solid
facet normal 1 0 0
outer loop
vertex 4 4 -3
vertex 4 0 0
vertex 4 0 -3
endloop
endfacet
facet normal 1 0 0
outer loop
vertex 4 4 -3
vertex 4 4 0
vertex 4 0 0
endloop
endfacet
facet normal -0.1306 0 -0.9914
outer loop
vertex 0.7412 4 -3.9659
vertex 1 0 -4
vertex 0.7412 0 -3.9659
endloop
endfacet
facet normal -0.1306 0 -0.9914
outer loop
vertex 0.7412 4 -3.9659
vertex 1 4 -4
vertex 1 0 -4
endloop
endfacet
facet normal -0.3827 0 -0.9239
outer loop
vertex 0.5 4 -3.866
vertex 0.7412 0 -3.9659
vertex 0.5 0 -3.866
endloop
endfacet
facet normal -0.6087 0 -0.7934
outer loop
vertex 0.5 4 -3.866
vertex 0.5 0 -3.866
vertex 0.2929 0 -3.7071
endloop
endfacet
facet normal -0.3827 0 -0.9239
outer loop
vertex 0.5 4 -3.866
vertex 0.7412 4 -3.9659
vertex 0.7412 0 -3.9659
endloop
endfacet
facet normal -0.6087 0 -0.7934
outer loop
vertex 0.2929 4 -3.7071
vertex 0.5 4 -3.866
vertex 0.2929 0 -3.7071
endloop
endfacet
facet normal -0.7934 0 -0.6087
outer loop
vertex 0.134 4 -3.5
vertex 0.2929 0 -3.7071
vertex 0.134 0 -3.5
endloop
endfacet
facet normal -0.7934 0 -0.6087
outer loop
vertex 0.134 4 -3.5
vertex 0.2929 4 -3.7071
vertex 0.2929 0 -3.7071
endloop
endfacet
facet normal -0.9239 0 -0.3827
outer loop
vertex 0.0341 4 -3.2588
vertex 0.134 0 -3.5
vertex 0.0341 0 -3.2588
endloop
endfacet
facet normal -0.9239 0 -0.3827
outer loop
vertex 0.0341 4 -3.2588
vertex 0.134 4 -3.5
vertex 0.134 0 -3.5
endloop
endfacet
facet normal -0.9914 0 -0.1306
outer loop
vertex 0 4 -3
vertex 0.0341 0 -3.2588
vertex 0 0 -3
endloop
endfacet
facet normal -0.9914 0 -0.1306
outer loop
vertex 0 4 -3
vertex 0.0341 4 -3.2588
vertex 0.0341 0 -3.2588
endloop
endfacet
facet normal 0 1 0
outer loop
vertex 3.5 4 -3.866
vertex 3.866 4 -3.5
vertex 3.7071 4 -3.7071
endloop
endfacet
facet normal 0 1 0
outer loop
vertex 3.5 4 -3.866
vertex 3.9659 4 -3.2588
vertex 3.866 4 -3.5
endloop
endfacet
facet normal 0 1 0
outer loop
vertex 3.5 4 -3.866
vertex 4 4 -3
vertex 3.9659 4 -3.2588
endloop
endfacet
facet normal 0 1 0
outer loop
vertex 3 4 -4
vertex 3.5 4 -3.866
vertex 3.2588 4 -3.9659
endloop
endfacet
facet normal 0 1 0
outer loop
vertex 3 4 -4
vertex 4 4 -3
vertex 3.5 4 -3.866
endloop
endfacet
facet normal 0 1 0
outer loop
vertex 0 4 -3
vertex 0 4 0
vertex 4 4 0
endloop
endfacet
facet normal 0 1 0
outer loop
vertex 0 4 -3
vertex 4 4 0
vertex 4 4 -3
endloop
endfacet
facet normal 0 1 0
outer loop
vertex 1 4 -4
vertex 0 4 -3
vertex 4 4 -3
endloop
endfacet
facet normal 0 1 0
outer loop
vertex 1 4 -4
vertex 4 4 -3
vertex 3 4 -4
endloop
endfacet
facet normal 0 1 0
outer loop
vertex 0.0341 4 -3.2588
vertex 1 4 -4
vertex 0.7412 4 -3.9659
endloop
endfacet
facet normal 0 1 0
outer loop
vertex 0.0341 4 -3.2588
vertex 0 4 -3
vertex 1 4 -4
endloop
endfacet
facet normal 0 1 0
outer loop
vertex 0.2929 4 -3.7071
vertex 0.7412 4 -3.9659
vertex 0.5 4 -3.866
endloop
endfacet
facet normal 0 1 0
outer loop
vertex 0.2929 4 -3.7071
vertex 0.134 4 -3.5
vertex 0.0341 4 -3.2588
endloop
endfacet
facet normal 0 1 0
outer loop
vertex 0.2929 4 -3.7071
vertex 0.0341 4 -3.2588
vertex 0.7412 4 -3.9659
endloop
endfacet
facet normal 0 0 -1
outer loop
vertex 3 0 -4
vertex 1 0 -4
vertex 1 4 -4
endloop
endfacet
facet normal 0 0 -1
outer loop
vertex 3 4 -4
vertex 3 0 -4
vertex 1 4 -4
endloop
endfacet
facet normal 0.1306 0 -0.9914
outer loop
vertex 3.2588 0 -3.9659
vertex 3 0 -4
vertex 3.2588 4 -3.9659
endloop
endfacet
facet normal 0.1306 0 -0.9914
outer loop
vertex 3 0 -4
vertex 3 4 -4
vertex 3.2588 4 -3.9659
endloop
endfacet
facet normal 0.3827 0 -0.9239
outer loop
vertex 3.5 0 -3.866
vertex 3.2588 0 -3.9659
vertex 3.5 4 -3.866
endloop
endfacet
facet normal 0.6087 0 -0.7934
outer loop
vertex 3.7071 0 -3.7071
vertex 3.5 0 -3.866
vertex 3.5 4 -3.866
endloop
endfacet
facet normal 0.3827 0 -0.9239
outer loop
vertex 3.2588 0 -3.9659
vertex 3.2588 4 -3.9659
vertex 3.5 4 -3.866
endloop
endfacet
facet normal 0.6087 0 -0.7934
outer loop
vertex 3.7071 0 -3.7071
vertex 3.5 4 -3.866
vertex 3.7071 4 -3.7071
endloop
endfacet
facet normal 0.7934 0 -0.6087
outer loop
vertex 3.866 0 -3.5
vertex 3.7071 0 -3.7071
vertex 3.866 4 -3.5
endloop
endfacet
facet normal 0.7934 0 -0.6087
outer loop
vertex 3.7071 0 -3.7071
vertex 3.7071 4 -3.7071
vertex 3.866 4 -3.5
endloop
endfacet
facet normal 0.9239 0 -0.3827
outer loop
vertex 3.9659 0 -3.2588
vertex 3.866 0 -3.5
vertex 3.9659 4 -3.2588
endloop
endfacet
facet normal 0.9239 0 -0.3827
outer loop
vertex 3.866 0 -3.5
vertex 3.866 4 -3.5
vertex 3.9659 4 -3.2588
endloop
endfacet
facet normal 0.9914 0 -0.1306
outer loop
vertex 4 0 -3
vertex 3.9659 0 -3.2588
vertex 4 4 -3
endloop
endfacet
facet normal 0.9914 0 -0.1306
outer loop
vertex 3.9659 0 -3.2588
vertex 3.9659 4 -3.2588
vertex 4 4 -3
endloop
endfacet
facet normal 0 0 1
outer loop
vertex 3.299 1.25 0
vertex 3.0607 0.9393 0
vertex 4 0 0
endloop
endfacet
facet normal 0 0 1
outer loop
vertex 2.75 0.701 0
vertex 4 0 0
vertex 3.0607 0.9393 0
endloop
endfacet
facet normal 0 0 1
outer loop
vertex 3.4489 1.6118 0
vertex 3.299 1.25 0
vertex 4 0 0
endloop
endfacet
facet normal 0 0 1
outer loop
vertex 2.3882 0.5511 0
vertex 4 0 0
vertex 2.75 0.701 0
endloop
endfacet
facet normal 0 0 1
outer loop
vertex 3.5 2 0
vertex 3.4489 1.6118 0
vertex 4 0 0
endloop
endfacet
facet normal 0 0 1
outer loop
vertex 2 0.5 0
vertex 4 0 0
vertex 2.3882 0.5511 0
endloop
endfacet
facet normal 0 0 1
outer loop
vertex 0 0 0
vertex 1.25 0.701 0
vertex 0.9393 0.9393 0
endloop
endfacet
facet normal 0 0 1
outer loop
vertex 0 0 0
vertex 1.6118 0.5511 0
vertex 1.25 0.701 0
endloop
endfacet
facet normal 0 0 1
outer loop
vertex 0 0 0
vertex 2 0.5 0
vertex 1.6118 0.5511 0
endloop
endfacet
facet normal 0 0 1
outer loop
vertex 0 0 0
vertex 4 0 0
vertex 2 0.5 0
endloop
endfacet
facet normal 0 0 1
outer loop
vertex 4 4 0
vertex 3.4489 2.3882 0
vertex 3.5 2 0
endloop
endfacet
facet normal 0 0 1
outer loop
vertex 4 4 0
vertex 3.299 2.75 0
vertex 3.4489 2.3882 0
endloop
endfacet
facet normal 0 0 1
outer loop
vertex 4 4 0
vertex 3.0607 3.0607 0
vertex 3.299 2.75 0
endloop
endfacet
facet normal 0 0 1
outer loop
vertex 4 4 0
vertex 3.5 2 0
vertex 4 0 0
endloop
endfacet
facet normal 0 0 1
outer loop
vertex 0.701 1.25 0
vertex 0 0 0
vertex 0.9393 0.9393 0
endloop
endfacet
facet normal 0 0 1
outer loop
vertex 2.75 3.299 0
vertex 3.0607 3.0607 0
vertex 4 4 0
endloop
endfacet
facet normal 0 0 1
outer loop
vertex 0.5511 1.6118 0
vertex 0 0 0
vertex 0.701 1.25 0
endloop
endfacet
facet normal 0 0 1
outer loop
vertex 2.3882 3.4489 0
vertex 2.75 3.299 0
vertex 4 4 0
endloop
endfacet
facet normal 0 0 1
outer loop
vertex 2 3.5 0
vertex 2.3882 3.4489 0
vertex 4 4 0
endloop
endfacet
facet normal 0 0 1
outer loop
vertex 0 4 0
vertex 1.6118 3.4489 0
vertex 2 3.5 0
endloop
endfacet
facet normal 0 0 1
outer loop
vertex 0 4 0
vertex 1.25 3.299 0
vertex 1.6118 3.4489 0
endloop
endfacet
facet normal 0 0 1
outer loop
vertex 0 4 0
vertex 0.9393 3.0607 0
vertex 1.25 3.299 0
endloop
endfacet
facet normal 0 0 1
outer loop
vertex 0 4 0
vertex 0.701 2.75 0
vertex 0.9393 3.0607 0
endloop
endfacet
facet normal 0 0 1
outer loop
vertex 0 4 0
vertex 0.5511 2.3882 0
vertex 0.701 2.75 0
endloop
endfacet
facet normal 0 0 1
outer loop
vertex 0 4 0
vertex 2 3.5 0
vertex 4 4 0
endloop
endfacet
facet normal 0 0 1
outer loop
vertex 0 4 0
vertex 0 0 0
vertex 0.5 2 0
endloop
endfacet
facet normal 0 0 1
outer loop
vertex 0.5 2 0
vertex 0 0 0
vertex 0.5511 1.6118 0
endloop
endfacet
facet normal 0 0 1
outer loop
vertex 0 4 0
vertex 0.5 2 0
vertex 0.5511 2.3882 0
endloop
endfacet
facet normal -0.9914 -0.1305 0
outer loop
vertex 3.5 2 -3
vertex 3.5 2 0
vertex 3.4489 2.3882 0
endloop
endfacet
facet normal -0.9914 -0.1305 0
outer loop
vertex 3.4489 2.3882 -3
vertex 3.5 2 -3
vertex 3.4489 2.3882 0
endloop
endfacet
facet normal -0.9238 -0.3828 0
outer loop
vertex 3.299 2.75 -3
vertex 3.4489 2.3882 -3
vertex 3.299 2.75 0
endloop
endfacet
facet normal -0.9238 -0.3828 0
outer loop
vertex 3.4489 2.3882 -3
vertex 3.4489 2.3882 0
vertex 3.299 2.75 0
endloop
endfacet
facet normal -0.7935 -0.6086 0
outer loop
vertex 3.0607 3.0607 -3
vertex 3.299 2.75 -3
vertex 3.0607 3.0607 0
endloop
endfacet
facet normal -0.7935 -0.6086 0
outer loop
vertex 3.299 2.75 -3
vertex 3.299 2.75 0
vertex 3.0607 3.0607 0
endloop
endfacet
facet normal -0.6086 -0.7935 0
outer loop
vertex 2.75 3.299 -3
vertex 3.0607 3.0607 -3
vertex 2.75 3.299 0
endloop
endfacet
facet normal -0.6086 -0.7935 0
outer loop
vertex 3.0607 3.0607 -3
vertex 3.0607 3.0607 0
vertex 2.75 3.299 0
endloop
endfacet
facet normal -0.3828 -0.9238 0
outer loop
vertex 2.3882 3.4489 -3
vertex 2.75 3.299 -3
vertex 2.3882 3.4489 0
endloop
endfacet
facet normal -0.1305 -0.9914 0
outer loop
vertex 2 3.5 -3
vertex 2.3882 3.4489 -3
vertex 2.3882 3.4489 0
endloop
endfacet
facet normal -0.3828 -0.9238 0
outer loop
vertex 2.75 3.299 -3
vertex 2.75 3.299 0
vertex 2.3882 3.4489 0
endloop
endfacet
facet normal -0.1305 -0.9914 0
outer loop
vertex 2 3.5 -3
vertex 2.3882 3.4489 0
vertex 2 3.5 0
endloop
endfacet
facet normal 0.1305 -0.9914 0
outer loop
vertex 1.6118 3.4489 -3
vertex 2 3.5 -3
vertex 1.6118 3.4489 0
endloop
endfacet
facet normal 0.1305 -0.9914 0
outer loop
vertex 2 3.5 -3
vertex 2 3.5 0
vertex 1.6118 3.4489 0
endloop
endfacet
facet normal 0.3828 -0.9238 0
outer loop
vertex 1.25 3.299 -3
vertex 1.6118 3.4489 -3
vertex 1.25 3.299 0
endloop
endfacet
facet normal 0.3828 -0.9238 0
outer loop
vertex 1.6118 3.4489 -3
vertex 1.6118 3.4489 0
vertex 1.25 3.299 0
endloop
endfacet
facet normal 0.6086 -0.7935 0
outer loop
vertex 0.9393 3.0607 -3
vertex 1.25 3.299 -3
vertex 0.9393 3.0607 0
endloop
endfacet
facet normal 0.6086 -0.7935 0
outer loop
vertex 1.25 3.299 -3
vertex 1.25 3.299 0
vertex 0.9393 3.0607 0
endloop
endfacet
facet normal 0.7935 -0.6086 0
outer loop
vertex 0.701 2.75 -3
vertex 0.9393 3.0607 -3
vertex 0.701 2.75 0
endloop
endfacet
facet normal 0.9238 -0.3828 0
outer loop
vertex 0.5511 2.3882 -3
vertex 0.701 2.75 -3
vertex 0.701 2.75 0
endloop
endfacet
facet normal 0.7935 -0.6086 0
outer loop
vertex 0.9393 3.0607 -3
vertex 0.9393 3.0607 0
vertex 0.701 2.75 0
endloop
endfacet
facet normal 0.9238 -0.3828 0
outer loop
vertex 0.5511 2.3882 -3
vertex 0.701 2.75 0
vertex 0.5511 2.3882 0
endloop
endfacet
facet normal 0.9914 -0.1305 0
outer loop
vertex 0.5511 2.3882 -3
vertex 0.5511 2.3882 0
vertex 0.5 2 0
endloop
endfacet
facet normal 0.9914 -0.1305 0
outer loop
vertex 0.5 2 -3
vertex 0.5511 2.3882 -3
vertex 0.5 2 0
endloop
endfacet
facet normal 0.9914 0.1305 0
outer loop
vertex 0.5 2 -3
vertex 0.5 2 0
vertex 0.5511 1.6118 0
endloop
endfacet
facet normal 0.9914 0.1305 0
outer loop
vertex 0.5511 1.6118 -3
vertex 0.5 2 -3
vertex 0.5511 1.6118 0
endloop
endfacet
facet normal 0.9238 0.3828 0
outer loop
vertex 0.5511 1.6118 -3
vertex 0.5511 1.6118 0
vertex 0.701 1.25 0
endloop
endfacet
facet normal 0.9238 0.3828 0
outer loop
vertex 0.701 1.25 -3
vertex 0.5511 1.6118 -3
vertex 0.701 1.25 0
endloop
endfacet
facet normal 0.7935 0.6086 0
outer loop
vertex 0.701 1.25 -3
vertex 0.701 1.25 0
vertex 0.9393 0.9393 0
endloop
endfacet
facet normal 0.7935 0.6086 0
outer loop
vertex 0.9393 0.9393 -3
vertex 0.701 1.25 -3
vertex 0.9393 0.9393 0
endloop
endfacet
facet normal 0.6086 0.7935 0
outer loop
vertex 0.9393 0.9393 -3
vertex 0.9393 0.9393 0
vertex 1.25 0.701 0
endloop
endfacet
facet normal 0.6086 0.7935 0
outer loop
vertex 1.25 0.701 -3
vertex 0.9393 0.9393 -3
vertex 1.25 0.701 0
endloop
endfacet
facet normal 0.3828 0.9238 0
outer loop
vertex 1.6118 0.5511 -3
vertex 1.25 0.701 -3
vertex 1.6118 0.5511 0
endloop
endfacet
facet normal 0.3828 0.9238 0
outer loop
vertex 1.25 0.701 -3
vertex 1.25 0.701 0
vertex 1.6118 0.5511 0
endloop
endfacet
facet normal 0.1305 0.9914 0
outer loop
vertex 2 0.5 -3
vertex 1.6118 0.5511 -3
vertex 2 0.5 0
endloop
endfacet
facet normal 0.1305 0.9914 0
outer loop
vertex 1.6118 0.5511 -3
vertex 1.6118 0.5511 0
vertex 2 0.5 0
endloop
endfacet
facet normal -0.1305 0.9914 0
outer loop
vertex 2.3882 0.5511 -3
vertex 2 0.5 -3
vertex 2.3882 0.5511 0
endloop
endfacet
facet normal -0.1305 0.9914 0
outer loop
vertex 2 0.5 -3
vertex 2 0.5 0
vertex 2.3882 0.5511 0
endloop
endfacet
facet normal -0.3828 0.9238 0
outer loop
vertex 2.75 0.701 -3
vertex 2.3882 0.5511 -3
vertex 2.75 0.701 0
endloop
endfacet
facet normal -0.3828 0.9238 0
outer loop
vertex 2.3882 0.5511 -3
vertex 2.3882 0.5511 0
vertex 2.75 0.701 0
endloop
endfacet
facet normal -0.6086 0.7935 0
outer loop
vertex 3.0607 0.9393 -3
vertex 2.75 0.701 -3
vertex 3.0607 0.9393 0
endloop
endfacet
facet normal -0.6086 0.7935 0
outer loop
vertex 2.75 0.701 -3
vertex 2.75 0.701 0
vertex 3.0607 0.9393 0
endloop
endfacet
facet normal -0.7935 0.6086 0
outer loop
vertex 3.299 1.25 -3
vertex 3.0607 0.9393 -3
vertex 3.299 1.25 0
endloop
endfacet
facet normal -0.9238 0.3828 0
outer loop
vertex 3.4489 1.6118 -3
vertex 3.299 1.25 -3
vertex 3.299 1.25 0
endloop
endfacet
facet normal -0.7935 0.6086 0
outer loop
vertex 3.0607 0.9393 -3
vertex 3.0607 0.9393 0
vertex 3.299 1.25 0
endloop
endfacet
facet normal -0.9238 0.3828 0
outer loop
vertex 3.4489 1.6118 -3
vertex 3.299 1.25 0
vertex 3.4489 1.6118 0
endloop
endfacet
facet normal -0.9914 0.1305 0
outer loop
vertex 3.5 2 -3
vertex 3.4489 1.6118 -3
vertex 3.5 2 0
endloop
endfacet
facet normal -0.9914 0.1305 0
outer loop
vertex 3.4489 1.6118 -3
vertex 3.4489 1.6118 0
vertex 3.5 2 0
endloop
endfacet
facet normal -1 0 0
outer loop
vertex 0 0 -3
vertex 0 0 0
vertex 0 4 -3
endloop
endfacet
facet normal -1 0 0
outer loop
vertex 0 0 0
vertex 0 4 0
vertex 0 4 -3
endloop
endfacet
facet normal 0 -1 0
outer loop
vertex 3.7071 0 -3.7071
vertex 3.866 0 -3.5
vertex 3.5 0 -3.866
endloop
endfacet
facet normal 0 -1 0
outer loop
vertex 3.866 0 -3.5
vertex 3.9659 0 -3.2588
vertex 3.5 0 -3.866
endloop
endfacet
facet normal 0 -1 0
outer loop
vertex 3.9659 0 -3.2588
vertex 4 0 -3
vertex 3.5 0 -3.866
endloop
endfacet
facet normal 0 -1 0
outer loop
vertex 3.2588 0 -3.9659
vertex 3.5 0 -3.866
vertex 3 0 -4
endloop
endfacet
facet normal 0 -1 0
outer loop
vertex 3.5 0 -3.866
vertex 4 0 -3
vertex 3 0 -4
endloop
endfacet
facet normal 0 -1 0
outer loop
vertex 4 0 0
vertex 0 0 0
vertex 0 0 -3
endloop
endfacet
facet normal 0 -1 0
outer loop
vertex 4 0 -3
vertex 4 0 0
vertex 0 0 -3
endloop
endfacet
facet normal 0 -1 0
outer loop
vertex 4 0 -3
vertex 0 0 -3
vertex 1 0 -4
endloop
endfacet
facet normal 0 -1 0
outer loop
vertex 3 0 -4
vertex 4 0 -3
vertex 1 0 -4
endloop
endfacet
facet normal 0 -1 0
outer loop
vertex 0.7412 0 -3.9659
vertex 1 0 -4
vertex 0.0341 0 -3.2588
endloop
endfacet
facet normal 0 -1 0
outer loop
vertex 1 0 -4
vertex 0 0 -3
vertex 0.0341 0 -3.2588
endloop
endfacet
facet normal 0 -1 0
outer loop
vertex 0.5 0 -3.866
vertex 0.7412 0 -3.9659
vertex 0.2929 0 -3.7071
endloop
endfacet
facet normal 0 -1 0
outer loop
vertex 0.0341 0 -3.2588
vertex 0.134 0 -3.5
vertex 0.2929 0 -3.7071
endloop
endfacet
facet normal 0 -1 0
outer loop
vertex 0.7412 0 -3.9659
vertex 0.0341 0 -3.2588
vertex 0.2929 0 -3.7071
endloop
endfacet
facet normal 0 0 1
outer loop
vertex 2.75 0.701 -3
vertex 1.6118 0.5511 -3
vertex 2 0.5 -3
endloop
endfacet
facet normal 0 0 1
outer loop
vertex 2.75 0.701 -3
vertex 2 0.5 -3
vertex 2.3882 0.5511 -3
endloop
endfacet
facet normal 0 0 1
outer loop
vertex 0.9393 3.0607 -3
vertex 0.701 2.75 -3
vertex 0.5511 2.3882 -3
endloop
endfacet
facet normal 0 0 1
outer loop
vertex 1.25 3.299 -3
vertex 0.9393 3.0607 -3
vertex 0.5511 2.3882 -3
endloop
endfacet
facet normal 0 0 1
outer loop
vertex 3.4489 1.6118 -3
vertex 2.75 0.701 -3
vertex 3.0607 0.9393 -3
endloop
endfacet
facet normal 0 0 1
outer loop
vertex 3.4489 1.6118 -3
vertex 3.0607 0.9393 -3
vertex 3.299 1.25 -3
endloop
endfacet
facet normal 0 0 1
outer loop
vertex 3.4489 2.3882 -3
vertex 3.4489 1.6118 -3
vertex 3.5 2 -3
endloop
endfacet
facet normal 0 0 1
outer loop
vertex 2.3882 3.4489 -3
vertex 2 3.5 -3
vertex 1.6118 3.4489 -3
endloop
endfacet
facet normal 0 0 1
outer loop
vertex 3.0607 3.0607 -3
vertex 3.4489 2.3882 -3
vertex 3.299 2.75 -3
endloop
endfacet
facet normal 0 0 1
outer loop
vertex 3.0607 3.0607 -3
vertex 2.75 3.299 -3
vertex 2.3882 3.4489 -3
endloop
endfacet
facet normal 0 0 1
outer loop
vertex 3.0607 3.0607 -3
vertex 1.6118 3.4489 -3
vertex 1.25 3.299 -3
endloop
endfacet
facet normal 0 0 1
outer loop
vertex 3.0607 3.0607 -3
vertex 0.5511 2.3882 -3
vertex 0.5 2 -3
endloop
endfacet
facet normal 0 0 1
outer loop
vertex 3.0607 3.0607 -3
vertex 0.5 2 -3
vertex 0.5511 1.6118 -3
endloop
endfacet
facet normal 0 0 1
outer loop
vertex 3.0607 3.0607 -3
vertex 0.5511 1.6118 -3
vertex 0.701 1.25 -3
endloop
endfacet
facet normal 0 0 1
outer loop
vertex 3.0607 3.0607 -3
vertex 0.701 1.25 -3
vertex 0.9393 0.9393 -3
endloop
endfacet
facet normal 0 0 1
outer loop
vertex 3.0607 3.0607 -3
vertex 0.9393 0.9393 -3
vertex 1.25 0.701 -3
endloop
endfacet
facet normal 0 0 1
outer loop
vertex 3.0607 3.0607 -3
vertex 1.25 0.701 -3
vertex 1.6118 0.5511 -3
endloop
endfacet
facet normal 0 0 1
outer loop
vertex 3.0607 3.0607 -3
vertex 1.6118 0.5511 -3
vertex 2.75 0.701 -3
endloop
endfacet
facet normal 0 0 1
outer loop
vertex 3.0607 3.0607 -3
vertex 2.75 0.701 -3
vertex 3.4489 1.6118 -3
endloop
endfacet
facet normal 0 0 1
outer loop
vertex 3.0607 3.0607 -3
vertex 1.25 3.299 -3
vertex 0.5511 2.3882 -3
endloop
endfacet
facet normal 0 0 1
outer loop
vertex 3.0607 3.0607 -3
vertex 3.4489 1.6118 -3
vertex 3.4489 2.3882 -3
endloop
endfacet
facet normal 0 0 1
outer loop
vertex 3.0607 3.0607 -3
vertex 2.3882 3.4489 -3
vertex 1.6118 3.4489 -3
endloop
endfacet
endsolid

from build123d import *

# Parameters (mm, degrees)
SKETCH2_W           = 4
SKETCH2_H           = 4
BOSS_EXTRUDE1_DEPTH = 4
FILLET1_R           = 1
SKETCH3_R           = 1.5
CUT_EXTRUDE1_DEPTH  = 3


with BuildPart() as part:
    # Sketch2 → Boss-Extrude1 (new body)
    with BuildSketch(Plane(origin=(0, 0, 0), x_dir=(0, 0, -1), z_dir=(1, 0, 0))):
        with Locations((2, 2)):
            Rectangle(SKETCH2_W, SKETCH2_H)
    extrude(amount=BOSS_EXTRUDE1_DEPTH)

    # Fillet1
    fillet1_edges = [part.edges().sort_by_distance(p)[0] for p in [
        (4, 2, -4),
        (0, 2, -4),
    ]]
    fillet(fillet1_edges, radius=FILLET1_R)

    # Sketch3 → Cut-Extrude1 (cut)
    with BuildSketch(Plane.XY):
        with Locations((2, 2)):
            Circle(SKETCH3_R)
    extrude(amount=-CUT_EXTRUDE1_DEPTH, mode=Mode.SUBTRACT)


solid = part.part
